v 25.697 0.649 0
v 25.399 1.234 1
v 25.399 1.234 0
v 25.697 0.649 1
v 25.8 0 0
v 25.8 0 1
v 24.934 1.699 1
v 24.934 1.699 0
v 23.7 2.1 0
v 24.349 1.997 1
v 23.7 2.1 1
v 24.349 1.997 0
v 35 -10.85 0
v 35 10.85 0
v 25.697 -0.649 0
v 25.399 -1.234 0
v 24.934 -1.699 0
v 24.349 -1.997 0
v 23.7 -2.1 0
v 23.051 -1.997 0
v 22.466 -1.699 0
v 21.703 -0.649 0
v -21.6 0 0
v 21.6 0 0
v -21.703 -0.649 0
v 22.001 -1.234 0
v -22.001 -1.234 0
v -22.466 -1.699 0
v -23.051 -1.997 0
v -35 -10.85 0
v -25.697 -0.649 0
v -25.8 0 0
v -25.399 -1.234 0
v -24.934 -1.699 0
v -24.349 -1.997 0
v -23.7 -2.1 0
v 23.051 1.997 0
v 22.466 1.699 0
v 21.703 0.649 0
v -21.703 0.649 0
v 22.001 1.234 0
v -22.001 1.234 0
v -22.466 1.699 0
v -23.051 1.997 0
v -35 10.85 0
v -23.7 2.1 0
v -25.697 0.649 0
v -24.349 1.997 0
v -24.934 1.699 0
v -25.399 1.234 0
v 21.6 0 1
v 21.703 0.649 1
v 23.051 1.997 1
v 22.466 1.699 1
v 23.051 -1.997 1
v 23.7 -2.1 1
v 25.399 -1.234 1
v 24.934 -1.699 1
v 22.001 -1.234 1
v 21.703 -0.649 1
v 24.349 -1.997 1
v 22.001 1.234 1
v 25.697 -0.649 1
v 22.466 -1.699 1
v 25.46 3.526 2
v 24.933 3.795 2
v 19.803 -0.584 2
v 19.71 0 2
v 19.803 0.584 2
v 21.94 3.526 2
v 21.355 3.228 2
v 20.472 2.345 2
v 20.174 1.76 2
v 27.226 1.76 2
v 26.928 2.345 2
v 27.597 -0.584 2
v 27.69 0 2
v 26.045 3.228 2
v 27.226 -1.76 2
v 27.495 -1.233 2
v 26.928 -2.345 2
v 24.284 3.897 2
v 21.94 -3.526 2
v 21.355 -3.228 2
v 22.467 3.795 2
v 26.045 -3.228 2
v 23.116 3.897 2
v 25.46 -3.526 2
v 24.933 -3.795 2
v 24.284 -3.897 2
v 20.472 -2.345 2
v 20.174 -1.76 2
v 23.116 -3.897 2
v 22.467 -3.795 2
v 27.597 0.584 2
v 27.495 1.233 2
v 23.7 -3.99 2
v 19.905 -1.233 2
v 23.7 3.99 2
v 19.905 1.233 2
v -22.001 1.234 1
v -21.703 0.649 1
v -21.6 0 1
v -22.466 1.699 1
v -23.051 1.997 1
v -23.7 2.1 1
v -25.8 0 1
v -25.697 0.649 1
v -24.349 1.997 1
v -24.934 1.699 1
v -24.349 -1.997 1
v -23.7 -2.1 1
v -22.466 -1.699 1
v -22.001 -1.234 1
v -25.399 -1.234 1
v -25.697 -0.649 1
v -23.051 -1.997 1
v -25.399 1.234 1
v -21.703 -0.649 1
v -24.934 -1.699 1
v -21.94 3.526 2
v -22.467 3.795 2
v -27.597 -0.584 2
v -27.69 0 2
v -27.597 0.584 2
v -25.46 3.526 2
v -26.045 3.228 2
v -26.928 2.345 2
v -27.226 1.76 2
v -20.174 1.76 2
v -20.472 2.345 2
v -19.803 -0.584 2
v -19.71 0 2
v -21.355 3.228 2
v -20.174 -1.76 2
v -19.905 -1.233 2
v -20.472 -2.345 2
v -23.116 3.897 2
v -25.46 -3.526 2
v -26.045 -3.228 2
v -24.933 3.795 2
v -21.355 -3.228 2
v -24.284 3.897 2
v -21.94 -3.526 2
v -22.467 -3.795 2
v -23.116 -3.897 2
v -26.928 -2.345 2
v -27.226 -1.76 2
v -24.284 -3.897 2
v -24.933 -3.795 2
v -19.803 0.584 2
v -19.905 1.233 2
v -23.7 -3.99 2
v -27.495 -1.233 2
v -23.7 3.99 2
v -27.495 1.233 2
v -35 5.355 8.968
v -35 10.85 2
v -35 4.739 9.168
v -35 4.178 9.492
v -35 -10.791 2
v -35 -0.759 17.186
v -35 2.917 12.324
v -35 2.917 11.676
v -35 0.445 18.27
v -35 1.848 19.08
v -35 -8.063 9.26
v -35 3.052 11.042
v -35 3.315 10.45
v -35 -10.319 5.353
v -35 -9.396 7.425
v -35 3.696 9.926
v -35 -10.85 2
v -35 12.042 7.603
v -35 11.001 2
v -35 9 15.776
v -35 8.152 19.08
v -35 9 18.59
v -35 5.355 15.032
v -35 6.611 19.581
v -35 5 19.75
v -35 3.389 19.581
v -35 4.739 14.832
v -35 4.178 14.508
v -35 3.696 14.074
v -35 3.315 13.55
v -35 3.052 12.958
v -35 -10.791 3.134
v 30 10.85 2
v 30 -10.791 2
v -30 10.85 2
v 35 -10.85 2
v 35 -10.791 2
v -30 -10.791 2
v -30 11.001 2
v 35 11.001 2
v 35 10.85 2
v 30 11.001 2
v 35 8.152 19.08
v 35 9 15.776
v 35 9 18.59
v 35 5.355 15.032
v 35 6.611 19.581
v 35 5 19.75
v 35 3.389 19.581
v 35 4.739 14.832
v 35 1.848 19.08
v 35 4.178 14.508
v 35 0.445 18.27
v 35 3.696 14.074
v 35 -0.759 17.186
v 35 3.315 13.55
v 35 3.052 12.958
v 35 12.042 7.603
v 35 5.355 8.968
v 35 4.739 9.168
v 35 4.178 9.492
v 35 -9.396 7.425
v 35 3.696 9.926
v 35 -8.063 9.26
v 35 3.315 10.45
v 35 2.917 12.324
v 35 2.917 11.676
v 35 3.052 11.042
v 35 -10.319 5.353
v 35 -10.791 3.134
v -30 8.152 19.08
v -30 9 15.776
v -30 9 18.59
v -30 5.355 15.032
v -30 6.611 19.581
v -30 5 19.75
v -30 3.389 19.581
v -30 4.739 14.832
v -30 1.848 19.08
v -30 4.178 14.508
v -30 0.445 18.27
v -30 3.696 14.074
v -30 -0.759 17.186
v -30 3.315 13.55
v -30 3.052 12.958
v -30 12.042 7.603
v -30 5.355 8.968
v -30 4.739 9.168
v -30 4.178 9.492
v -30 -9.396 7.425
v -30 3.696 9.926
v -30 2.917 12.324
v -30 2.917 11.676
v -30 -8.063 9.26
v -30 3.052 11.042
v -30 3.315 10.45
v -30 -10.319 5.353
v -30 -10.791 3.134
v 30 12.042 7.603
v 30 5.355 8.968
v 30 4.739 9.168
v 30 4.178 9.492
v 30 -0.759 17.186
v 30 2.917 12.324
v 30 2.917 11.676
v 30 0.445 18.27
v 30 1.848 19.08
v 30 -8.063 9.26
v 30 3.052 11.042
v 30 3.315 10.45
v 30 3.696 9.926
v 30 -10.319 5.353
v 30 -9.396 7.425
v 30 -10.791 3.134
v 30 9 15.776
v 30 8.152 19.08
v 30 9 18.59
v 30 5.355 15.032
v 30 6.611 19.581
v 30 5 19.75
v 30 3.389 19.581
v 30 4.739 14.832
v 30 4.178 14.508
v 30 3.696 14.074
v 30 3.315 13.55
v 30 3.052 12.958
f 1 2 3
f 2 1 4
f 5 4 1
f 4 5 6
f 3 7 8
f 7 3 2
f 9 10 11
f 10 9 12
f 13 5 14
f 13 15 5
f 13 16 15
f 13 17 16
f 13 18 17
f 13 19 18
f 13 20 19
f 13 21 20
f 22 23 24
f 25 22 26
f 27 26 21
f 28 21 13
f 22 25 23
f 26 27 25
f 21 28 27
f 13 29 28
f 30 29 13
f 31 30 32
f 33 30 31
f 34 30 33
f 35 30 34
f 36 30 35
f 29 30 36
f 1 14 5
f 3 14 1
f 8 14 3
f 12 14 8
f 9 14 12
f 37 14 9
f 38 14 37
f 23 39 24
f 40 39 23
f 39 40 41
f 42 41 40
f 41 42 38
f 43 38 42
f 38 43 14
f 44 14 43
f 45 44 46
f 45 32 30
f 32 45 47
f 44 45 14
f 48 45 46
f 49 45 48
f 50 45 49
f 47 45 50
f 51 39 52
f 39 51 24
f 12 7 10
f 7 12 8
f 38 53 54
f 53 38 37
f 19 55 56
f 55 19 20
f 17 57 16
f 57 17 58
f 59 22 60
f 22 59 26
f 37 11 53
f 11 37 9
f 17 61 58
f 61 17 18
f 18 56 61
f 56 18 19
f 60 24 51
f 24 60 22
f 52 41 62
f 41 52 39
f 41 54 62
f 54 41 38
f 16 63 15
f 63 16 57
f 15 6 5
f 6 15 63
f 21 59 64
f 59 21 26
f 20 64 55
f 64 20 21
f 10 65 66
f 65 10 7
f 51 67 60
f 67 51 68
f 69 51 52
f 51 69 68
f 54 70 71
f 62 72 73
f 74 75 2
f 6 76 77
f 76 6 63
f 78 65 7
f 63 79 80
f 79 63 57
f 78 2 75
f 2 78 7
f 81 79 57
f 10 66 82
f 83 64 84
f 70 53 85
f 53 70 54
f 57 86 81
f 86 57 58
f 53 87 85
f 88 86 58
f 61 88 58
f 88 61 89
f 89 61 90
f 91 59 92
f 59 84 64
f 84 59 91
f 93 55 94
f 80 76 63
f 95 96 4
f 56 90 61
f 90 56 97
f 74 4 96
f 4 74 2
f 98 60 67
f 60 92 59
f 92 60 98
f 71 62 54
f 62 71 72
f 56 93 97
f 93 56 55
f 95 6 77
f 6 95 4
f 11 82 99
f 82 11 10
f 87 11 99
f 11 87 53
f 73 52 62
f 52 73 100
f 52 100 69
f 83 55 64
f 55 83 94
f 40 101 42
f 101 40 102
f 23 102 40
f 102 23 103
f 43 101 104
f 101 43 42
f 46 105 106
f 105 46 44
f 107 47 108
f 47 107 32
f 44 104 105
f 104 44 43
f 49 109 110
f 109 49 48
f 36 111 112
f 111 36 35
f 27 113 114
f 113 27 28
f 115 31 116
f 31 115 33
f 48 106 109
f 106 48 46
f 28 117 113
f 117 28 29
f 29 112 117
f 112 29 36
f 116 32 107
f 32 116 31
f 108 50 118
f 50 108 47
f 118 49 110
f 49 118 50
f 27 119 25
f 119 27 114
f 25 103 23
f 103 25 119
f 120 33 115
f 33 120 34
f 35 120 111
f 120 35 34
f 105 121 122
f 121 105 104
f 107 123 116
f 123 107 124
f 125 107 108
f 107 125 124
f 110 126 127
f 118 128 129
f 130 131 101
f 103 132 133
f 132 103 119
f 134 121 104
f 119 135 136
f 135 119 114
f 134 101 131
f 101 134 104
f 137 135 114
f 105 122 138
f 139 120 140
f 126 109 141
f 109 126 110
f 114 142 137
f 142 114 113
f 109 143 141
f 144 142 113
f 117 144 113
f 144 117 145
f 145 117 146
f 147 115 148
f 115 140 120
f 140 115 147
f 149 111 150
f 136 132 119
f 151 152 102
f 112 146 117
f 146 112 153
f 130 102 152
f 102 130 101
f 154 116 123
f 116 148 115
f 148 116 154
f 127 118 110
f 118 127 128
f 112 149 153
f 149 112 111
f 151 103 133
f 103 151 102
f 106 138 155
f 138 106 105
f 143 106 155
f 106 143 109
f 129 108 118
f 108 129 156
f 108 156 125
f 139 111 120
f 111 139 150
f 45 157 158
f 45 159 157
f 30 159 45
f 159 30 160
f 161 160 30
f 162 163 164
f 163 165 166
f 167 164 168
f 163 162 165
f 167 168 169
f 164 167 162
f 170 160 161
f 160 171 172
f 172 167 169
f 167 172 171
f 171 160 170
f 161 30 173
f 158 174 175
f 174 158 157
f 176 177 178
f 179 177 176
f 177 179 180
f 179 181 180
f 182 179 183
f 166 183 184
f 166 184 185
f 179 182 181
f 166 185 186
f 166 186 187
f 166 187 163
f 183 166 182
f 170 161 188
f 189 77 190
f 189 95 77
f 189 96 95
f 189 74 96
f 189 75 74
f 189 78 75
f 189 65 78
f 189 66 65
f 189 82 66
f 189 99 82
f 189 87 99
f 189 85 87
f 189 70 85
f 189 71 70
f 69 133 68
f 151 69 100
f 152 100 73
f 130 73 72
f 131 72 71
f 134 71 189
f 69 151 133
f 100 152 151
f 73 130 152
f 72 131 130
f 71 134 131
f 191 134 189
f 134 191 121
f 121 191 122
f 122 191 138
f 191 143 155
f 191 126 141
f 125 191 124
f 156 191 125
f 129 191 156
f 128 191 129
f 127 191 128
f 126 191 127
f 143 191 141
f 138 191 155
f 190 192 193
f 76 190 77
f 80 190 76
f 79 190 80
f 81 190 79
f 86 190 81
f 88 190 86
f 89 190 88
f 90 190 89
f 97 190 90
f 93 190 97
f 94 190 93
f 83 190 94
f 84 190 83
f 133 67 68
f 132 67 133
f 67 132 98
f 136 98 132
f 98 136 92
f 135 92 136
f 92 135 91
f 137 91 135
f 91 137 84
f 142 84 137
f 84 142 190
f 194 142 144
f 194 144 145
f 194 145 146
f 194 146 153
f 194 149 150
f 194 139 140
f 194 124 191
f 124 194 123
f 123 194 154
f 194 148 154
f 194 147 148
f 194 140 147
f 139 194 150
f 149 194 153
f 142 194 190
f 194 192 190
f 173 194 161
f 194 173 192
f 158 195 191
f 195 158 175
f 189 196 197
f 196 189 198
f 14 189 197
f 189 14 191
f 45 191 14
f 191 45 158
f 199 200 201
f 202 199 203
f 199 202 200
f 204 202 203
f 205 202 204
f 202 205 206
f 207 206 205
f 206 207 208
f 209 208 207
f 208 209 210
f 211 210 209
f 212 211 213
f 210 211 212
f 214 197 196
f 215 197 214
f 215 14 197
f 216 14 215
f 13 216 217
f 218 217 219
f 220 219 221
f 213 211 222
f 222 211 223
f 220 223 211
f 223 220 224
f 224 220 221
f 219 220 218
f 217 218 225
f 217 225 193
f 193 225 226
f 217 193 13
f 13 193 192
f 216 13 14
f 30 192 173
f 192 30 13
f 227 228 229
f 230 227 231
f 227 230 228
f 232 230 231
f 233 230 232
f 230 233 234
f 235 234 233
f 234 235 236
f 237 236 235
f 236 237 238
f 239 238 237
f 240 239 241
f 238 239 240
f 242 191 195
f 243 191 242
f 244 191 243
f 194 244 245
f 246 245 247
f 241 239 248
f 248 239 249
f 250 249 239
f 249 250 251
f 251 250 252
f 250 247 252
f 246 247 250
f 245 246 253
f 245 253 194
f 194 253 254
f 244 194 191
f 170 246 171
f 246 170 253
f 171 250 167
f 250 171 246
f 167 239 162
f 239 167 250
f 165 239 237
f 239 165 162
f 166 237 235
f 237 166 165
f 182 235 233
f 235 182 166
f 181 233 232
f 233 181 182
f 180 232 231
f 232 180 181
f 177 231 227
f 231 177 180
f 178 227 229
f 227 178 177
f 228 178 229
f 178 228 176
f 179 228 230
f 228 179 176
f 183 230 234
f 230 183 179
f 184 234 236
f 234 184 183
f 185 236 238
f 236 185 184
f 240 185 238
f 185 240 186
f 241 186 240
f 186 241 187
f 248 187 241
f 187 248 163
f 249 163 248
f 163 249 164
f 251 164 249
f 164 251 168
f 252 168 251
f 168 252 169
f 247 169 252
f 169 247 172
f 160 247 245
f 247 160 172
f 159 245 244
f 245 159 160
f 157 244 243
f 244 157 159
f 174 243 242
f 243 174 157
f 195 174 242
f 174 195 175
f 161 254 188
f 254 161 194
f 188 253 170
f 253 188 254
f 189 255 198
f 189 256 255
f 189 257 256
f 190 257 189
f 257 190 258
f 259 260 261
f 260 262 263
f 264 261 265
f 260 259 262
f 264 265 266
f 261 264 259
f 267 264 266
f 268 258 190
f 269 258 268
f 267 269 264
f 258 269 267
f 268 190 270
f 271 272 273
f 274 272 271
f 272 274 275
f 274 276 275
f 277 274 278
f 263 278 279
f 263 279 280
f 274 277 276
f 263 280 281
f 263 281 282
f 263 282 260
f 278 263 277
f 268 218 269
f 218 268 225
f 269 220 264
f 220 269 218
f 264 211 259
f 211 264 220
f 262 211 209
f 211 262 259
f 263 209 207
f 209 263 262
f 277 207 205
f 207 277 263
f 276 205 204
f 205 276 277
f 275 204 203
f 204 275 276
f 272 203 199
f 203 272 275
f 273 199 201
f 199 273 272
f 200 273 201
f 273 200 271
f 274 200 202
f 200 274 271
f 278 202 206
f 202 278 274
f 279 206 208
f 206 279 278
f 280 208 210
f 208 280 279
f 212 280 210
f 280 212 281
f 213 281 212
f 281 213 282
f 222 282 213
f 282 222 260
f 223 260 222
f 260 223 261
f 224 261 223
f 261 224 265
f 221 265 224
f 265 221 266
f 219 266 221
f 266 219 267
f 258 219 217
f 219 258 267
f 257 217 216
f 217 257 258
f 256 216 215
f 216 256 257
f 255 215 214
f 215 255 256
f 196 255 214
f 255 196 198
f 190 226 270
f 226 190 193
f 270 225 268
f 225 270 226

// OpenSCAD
//Text to be displayed
_TEXT = ""; //
//Diameter of handle
_HANDLE_DIAMETER = 6.2;
//Spacing between hooks
_HOOK_SPACING = 60;
//Mount hole diameter
_MOUNT_HOLE_DIAMETER = 4.2;


_HOOK_WIDTH = 5;
_MOUNT_HOLE_SPACING = _HOOK_SPACING - _MOUNT_HOLE_DIAMETER  * 3;


$fs = 0.5;

module hook_space(){
    hull(){
        circle(d=_HANDLE_DIAMETER);
        translate([0,_HANDLE_DIAMETER*5])
        circle(d=_HANDLE_DIAMETER*3);
    }    
    translate([0,3])
    square(50);
}



module hook(){
    base_size = _HANDLE_DIAMETER * 3.5;
    end_size = _HANDLE_DIAMETER * 2.5;
    end_position = [10,5];
    
    rotate([0,-90,0])
    linear_extrude(_HOOK_WIDTH)
    difference(){
        hull(){
            translate(end_position)circle(d = end_size);
            circle(d = base_size);
        }
        
        translate(end_position + [0,1])hook_space();
        translate([-base_size,-base_size/2])
        square([base_size,base_size*2]);
    }
}

module screw_hole(){
    
    cylinder(d=_MOUNT_HOLE_DIAMETER,1,$fn=20);
    translate([0,0,1])
    hull(){
        cylinder(d=_MOUNT_HOLE_DIAMETER,1,$fn=20);
        translate([0,0,10])
        cylinder(d=_MOUNT_HOLE_DIAMETER*10,1,$fn=20);
    }
}

module base_text(){
    linear_extrude(1)
    text(_TEXT, font="Verdana:style=Bold", valign="center", halign="center");
}


module base_plate(){
    width = _HOOK_SPACING + _HOOK_WIDTH*2;
    height = _HANDLE_DIAMETER * 3.5;
    
    union(){
        difference(){
            linear_extrude(2)
            square([width,height],center=true);
            
            translate([_MOUNT_HOLE_SPACING/2,0])screw_hole();
            translate([-_MOUNT_HOLE_SPACING/2,0])screw_hole();
        }
        
        translate([-_HOOK_SPACING/2,0,2])hook();
        mirror([1,0,0])
        translate([-_HOOK_SPACING/2,0,2])hook();
        
        translate([0,0,2])
        base_text();
    }
    
}

base_plate();
